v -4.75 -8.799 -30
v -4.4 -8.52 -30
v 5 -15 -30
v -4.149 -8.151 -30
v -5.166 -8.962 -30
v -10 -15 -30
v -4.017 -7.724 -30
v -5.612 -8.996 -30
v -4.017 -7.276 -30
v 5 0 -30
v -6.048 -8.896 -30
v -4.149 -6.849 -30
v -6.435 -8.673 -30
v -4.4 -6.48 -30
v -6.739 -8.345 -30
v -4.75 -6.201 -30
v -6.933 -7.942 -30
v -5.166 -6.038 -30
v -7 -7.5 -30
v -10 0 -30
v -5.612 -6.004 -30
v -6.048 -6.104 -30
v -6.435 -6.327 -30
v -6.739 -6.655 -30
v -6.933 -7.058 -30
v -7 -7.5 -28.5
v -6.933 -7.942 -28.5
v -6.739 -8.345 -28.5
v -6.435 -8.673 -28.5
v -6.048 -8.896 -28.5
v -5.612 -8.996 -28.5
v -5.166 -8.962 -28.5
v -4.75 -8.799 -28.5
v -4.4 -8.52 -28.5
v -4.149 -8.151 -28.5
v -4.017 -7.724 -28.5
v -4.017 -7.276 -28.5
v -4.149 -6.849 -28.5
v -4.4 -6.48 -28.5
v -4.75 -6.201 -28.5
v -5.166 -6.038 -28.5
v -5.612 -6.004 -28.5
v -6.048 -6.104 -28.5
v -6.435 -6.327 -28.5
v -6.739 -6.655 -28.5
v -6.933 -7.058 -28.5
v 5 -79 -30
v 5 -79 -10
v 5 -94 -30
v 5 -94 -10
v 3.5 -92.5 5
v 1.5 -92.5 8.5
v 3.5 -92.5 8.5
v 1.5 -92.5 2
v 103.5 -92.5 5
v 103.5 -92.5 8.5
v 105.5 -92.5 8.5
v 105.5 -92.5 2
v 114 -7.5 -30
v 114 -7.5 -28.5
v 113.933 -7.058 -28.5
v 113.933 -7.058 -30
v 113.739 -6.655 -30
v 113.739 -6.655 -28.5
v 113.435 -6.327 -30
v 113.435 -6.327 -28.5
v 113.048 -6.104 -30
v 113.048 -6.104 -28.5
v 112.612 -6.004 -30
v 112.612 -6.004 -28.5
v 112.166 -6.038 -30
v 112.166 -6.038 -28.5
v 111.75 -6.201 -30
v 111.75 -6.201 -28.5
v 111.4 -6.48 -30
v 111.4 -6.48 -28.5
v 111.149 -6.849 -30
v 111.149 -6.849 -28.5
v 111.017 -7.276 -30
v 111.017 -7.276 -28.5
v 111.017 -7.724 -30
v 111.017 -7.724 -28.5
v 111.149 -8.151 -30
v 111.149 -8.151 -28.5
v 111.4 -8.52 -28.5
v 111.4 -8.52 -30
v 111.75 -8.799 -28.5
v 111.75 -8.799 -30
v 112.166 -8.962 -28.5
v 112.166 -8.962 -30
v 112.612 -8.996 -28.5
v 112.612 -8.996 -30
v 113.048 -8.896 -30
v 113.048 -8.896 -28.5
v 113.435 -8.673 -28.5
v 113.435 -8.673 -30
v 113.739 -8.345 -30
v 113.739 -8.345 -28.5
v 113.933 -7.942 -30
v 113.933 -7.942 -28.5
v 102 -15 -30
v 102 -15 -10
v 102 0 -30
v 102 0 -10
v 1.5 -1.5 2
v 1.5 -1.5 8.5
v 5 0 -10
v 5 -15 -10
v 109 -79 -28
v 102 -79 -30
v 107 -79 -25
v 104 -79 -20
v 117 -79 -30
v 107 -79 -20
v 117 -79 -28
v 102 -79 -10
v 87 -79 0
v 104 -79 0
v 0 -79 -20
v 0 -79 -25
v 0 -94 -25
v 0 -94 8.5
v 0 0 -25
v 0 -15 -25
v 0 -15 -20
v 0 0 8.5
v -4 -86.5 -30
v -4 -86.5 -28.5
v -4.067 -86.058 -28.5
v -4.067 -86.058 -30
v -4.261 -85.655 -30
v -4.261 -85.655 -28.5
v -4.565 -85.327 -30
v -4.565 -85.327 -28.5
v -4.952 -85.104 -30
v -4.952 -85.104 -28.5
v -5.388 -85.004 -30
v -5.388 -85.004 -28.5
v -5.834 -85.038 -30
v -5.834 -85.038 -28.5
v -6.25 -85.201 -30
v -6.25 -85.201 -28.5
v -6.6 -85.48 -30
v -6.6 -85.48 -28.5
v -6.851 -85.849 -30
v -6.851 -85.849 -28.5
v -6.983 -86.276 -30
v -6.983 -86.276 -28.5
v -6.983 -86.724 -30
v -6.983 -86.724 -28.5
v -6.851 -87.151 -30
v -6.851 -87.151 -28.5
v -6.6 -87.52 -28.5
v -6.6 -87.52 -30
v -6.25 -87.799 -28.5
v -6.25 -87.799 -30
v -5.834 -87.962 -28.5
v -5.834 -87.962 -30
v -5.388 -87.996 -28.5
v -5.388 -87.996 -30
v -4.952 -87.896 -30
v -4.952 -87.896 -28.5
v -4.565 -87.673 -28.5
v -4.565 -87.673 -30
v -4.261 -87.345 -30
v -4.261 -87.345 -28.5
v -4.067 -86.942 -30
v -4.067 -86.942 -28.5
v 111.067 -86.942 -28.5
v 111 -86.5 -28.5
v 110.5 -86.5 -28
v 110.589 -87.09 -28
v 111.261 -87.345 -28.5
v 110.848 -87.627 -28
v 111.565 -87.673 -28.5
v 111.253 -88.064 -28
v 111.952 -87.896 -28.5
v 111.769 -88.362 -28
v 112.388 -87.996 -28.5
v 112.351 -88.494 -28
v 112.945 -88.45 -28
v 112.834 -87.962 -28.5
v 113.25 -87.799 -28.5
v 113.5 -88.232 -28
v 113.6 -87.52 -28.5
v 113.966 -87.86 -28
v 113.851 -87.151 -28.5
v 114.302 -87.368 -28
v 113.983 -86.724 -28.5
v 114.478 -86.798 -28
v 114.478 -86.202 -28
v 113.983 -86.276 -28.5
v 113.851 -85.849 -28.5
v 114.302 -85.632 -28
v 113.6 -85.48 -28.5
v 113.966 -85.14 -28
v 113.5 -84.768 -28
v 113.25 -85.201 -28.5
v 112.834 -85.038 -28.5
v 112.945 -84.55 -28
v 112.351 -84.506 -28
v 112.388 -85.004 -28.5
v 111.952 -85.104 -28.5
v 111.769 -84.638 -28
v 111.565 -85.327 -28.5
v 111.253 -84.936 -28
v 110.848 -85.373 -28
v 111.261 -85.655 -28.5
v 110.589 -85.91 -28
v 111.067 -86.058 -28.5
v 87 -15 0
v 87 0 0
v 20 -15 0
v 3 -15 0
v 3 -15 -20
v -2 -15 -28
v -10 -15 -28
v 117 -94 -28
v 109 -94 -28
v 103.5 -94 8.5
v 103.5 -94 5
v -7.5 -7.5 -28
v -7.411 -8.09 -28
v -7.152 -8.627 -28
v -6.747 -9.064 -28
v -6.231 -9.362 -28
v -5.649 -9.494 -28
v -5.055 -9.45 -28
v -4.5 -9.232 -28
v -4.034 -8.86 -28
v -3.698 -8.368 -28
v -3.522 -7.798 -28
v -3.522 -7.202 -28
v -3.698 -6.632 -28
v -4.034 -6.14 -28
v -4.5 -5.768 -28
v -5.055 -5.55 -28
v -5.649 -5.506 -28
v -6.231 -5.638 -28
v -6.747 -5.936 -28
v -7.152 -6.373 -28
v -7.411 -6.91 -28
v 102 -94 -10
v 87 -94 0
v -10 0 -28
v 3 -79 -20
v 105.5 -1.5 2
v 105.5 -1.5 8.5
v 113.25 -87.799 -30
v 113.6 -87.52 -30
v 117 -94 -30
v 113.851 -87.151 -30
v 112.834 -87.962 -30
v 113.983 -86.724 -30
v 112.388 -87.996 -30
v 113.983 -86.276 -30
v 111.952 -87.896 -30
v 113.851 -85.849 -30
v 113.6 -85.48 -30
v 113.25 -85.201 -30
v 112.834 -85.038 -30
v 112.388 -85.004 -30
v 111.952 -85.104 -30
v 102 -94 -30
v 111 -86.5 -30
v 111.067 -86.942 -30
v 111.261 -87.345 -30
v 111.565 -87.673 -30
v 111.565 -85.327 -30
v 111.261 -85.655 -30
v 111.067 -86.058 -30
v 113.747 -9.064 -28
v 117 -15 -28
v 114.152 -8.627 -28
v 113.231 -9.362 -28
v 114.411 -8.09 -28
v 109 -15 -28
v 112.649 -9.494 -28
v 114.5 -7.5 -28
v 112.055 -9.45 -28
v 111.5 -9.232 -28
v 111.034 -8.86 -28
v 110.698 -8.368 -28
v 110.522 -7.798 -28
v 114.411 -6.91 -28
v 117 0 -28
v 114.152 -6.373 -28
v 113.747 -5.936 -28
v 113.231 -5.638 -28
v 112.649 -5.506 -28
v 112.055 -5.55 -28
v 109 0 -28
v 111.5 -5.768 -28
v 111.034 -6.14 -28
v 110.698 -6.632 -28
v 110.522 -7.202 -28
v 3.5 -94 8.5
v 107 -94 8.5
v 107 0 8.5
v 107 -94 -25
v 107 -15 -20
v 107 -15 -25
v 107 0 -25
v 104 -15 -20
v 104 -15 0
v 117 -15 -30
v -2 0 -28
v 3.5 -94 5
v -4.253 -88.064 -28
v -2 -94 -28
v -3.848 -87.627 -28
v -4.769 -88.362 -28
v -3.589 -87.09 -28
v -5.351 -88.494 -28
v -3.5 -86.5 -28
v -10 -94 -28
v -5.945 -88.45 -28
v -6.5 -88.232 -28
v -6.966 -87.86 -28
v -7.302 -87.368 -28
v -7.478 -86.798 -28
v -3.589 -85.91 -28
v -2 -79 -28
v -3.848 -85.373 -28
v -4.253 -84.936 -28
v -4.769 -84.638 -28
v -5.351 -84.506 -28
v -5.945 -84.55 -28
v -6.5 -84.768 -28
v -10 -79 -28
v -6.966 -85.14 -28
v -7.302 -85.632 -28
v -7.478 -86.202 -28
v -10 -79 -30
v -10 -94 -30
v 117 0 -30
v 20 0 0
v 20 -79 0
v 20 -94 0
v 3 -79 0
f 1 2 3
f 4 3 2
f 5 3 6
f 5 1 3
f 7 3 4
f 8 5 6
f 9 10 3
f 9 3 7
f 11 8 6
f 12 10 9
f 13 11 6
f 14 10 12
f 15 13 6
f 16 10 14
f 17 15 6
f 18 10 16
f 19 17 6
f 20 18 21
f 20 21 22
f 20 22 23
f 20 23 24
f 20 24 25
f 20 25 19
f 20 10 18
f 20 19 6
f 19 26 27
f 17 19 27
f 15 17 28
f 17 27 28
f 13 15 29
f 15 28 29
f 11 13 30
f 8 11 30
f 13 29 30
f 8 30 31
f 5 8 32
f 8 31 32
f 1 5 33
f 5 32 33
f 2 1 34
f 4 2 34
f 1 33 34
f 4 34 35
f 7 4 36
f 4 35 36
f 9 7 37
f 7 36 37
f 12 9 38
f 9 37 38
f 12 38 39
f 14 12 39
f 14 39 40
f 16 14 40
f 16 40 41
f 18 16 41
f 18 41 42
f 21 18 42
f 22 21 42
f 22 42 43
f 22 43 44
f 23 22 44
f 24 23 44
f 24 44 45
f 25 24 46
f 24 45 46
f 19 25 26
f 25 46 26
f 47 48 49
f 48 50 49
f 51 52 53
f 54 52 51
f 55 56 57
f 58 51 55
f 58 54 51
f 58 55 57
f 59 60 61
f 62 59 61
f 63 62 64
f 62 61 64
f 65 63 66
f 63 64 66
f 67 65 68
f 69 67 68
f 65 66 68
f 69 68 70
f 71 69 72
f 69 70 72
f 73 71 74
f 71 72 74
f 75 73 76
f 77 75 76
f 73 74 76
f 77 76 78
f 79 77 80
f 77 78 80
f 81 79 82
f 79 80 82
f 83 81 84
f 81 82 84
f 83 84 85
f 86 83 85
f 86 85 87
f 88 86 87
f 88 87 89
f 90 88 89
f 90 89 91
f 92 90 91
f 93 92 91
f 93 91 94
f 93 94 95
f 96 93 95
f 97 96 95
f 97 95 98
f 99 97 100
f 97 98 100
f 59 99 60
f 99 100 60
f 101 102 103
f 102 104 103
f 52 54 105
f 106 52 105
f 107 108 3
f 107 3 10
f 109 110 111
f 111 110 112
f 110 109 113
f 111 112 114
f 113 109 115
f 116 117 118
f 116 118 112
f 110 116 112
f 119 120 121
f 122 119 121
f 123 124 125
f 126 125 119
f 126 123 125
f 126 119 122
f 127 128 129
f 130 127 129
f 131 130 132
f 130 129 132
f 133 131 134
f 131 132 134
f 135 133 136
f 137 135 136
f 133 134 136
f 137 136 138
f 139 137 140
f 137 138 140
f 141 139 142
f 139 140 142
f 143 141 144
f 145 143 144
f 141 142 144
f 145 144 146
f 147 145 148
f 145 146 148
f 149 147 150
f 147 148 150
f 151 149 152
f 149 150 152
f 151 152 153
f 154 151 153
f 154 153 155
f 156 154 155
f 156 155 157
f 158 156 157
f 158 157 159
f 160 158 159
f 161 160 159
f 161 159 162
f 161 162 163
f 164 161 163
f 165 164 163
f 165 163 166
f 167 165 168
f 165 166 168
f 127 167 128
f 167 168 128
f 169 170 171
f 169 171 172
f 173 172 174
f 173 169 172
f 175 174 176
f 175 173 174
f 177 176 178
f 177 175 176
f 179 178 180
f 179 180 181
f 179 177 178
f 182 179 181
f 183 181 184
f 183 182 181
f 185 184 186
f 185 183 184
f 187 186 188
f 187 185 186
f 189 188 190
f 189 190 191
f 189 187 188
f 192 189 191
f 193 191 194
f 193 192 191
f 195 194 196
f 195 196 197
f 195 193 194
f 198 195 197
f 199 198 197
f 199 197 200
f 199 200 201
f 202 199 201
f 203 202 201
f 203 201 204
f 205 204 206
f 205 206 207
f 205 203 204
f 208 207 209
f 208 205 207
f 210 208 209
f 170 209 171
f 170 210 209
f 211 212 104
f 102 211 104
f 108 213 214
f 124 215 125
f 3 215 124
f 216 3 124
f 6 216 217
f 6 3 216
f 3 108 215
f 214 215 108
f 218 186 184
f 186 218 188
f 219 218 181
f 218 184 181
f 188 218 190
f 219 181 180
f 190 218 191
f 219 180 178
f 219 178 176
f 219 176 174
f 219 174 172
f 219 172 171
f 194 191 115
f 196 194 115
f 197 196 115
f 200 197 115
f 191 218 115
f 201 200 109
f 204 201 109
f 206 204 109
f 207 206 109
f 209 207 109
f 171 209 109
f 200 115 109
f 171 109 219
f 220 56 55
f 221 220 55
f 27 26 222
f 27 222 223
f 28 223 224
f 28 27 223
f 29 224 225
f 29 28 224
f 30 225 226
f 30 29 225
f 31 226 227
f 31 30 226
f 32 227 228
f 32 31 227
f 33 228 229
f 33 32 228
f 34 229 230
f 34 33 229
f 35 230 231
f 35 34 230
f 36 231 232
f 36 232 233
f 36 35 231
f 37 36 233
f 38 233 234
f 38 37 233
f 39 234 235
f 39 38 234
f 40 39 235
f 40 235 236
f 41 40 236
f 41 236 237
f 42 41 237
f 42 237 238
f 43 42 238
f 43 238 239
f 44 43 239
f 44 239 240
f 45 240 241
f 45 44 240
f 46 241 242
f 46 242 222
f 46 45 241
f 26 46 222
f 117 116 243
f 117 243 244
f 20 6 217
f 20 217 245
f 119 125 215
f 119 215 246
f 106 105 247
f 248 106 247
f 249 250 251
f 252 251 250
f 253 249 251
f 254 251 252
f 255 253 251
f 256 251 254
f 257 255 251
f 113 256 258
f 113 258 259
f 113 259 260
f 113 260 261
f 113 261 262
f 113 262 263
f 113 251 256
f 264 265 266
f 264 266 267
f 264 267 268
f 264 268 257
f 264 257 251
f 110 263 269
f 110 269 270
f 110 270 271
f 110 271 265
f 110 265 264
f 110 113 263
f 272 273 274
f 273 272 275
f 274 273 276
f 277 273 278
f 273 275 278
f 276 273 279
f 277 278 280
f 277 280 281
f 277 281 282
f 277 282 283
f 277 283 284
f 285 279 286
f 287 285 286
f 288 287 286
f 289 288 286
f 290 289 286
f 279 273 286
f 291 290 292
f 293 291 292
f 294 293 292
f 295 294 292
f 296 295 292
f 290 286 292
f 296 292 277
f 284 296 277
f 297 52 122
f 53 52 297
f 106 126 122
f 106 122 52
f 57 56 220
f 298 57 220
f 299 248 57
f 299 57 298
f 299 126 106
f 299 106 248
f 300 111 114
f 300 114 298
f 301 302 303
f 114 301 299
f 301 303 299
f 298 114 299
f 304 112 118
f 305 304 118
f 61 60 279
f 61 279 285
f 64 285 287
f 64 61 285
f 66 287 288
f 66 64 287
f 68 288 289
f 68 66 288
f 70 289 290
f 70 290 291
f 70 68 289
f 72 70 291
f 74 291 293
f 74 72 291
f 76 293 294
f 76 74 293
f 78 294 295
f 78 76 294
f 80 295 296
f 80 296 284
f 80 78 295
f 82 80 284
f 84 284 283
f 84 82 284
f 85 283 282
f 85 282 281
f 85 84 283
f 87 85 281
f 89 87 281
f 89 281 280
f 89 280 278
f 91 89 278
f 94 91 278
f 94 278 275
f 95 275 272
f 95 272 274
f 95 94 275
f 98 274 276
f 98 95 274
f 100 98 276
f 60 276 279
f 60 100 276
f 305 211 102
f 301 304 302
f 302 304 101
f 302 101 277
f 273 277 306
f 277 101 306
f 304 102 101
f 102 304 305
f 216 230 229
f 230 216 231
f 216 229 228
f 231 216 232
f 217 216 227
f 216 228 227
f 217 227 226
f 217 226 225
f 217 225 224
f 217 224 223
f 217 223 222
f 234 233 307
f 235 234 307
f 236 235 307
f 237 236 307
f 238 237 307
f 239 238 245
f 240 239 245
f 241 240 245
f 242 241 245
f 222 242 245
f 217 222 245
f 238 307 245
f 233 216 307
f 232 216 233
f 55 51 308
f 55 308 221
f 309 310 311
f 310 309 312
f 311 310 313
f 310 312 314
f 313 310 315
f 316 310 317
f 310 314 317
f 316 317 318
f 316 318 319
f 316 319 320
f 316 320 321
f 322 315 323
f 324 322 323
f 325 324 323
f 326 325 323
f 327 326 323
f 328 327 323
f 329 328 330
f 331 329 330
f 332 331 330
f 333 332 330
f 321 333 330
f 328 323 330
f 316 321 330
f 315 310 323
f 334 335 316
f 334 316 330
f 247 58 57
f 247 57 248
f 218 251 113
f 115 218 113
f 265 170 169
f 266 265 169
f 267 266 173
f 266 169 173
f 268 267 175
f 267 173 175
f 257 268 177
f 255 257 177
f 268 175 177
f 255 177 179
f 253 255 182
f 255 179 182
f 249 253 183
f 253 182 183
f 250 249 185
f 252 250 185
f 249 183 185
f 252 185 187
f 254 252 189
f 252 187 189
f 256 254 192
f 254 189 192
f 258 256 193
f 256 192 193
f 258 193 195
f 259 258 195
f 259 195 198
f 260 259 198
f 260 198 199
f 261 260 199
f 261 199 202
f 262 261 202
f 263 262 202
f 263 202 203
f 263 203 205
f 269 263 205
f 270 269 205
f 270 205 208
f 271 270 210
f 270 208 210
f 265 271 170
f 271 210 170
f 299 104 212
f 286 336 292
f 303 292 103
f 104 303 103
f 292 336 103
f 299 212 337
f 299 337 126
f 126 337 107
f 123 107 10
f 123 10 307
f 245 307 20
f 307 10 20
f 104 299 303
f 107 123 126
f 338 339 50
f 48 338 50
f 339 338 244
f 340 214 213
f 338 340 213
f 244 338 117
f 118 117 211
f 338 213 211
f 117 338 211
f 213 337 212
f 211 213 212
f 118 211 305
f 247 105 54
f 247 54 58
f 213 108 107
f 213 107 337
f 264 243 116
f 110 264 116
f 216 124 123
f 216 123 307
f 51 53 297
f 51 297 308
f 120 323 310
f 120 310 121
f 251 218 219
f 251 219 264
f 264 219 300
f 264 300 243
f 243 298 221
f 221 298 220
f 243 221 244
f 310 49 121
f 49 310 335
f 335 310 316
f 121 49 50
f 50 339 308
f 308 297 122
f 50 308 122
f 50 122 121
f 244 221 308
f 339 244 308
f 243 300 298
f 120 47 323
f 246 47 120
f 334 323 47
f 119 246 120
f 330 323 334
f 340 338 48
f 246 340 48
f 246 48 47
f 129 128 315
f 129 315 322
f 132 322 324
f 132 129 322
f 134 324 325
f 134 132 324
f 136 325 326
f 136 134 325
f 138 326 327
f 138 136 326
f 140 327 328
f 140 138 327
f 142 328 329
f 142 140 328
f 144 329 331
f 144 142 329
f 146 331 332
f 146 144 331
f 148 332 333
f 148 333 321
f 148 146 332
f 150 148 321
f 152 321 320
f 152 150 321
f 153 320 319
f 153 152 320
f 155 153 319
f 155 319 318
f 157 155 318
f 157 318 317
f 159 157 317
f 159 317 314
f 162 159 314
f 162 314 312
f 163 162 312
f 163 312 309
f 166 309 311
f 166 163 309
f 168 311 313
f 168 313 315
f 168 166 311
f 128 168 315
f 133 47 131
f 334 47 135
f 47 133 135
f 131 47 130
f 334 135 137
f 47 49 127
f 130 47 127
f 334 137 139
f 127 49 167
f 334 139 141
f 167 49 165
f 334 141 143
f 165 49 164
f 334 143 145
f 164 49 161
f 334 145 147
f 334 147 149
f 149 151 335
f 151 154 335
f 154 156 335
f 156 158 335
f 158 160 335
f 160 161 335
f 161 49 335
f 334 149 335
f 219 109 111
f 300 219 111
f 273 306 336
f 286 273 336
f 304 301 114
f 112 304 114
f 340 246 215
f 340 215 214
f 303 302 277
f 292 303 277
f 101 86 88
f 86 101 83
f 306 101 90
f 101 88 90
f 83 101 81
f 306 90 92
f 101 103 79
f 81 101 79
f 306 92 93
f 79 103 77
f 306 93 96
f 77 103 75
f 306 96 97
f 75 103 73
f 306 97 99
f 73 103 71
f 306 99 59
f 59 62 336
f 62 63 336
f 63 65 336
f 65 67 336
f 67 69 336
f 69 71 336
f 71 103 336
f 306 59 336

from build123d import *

# Parameters (mm, degrees)
SKETCH_1_W               = 107
SKETCH_1_H               = 94
EXTRUDE_1_DEPTH          = 2
SKETCH_2_W               = 107
SKETCH_2_H               = 94
SKETCH_2_W_2             = 104
SKETCH_2_H_2             = 91
EXTRUDE_2_DEPTH          = 6.5
SKETCH_5_W               = 100
SKETCH_5_H               = 3.5
CUT_EXTRUDE_2_DEPTH      = 1.5
SKETCH_3_W               = 5
SKETCH_3_H               = 15
EXTRUDE_3_DEPTH          = 30
CUT_EXTRUDE_3_DEPTH      = 148.537283424
CUT_EXTRUDE_3_DEPTH_BACK = 30
SKETCH_6_W               = 3
SKETCH_6_H               = 9
SKETCH_7_W               = 10
SKETCH_7_H               = 15
EXTRUDE_4_DEPTH          = 2
SKETCH_8_R               = 1.5
CUT_EXTRUDE_4_DEPTH      = 2
CHAMFER_1_SIZE           = 0.5
EXTRUDE_5_DEPTH          = 3
EXTRUDE_6_DEPTH          = 3
EXTRUDE_7_DEPTH          = 3
MIRROR_2_COPY_1_DEPTH    = 3
EXTRUDE_8_DEPTH          = 15
EXTRUDE_9_DEPTH          = 15
EXTRUDE_10_DEPTH         = 9
EXTRUDE_11_DEPTH         = 9
EXTRUDE_12_DEPTH         = 3


with BuildPart() as part:
    # 草图1 → 凸台-拉伸1 (new body)
    with BuildSketch(Plane.XY):
        with Locations((53.5, -47)):
            Rectangle(SKETCH_1_W, SKETCH_1_H)
    extrude(amount=EXTRUDE_1_DEPTH)

    # 草图2 → 凸台-拉伸2 (add)
    with BuildSketch(Plane.XY.offset(2)):
        with Locations((53.5, -47)):
            Rectangle(SKETCH_2_W, SKETCH_2_H)
        with Locations((53.5, -47)):
            Rectangle(SKETCH_2_W_2, SKETCH_2_H_2, mode=Mode.SUBTRACT)
    extrude(amount=EXTRUDE_2_DEPTH)

    # 草图5 → 切除-拉伸2 (cut)
    with BuildSketch(Plane(origin=(0, -92.5, 0), x_dir=(1, 0, 0), z_dir=(0, 1, 0))):
        with Locations((53.5, -6.75)):
            Rectangle(SKETCH_5_W, SKETCH_5_H)
    extrude(amount=-CUT_EXTRUDE_2_DEPTH, mode=Mode.SUBTRACT)

    # 草图3 → 凸台-拉伸3 (add)
    with BuildSketch(Plane(origin=(0, 0, 0), x_dir=(-1, 0, 0), z_dir=(0, 0, -1))):
        with Locations((-2.5, -7.5)):
            Rectangle(SKETCH_3_W, SKETCH_3_H)
        with Locations((-104.5, -7.5)):
            Rectangle(SKETCH_3_W, SKETCH_3_H)
        with Locations((-2.5, -86.5)):
            Rectangle(SKETCH_3_W, SKETCH_3_H)
        with Locations((-104.5, -86.5)):
            Rectangle(SKETCH_3_W, SKETCH_3_H)
    extrude(amount=EXTRUDE_3_DEPTH)

    # 草图6 → 切除-拉伸3 (cut, two sides: drawn at the far end of the back side and taken through both)
    with BuildSketch(Plane(origin=(0, 0, -30), x_dir=(-1, 0, 0), z_dir=(0, 0, -1)).offset(-CUT_EXTRUDE_3_DEPTH_BACK)):
        with Locations((-103.5, -7.5)):
            Rectangle(SKETCH_6_W, SKETCH_6_H)
        with Locations((-103.5, -86.5)):
            Rectangle(SKETCH_6_W, SKETCH_6_H)
        with Locations((-3.5, -86.5)):
            Rectangle(SKETCH_6_W, SKETCH_6_H)
        with Locations((-3.5, -7.5)):
            Rectangle(SKETCH_6_W, SKETCH_6_H)
    extrude(amount=CUT_EXTRUDE_3_DEPTH + CUT_EXTRUDE_3_DEPTH_BACK, mode=Mode.SUBTRACT)

    # 草图7 → 凸台-拉伸4 (add)
    with BuildSketch(Plane(origin=(0, 0, -30), x_dir=(-1, 0, 0), z_dir=(0, 0, -1))):
        with Locations((5, -7.5)):
            Rectangle(SKETCH_7_W, SKETCH_7_H)
        with Locations((5, -86.5)):
            Rectangle(SKETCH_7_W, SKETCH_7_H)
        with Locations((-112, -7.5)):
            Rectangle(SKETCH_7_W, SKETCH_7_H)
        with Locations((-112, -86.5)):
            Rectangle(SKETCH_7_W, SKETCH_7_H)
    extrude(amount=-EXTRUDE_4_DEPTH)

    # 草图8 → 切除-拉伸4 (cut)
    with BuildSketch(Plane.XY.offset(-28)):
        with Locations((112.5, -7.5)):
            Circle(SKETCH_8_R)
        with Locations(Location((112.5, -86.5, 0), (0, 0, 180))):
            Circle(SKETCH_8_R)
        with Locations(Location((-5.5, -7.5, 0), (0, 0, 180))):
            Circle(SKETCH_8_R)
        with Locations((-5.5, -86.5)):
            Circle(SKETCH_8_R)
    extrude(amount=-CUT_EXTRUDE_4_DEPTH, mode=Mode.SUBTRACT)

    # 倒角1
    chamfer_1_edges = [part.edges().sort_by_distance(p)[0] for p in [
        (114, -86.5, -28),
        (-4, -7.5, -28),
        (-7, -86.5, -28),
        (111, -7.5, -28),
    ]]
    chamfer(chamfer_1_edges, length=CHAMFER_1_SIZE)

    # 草图9 → 凸台-拉伸5 (add)
    with BuildSketch(Plane.XZ.offset(94)):
        Polygon((87, 0), (102, -10), (102, 0), align=None)
        Polygon((5, 0), (20, 0), (5, -10), align=None)
    extrude_5 = extrude(amount=-EXTRUDE_5_DEPTH)

    # 草图10 → 凸台-拉伸6 (add)
    with BuildSketch(Plane(origin=(0, -79, 0), x_dir=(1, 0, 0), z_dir=(0, 1, 0))):
        Polygon((102, 10), (87, 0), (102, 0), align=None)
        Polygon((5, 0), (5, 10), (20, 0), align=None)
    extrude_6 = extrude(amount=-EXTRUDE_6_DEPTH)

    # 草图11 → 凸台-拉伸7 (add)
    with BuildSketch(Plane.ZY):
        Polygon((-20, -79), (0, -69), (0, -79), align=None)
    extrude_7 = extrude(amount=-EXTRUDE_7_DEPTH)

    # 镜向1: 凸台-拉伸7 across plane
    add(extrude_7.mirror(Plane(origin=(53.5, 0, 0), x_dir=(0, 0, 1), z_dir=(1, 0, 0))))

    # 镜向2: 凸台-拉伸5, 凸台-拉伸6, 凸台-拉伸7 across plane
    add(extrude_5.mirror(Plane.ZX.offset(-47)))
    add(extrude_6.mirror(Plane.ZX.offset(-47)))
    add(extrude_7.mirror(Plane.ZX.offset(-47)))

    # 镜向2 copy 1 sketch → 镜向2 copy 1 (add)
    with BuildSketch(Plane(origin=(107, -94, 0), x_dir=(0, 0, 1), z_dir=(1, 0, 0))):
        Polygon((-20, -79), (0, -69), (0, -79), align=None)
    extrude(amount=-MIRROR_2_COPY_1_DEPTH)

    # 草图12 → 凸台-拉伸8 (add)
    with BuildSketch(Plane(origin=(0, 0, 0), x_dir=(1, 0, 0), z_dir=(0, 1, 0))):
        Polygon((107, 25), (109, 28), (107, 28), align=None)
    extrude_8 = extrude(amount=-EXTRUDE_8_DEPTH)

    # 草图13 → 凸台-拉伸9 (add)
    with BuildSketch(Plane.XZ.offset(94)):
        Polygon((109, -28), (107, -25), (107, -28), align=None)
    extrude_9 = extrude(amount=-EXTRUDE_9_DEPTH)

    # 镜向3: 凸台-拉伸8, 凸台-拉伸9 across plane
    add(extrude_8.mirror(Plane(origin=(53.5, 0, 0), x_dir=(0, 0, 1), z_dir=(1, 0, 0))))
    add(extrude_9.mirror(Plane(origin=(53.5, 0, 0), x_dir=(0, 0, 1), z_dir=(1, 0, 0))))

    # 草图14 → 凸台-拉伸10 (add)
    with BuildSketch(Plane(origin=(0, -91, 0), x_dir=(1, 0, 0), z_dir=(0, 1, 0))):
        Polygon((2, 30), (2, 0), (20, 0), (5, 10), (5, 30), align=None)
        Polygon((102, 30), (102, 10), (87, 0), (105, 0), (105, 30), align=None)
    extrude(amount=EXTRUDE_10_DEPTH)

    # 草图15 → 凸台-拉伸11 (add)
    with BuildSketch(Plane.XZ.offset(3)):
        Polygon((105, -30), (105, 0), (87, 0), (102, -10), (102, -30), align=None)
        Polygon((5, -30), (5, -10), (20, 0), (2, 0), (2, -30), align=None)
    extrude(amount=EXTRUDE_11_DEPTH)

    # 草图17 → 凸台-拉伸12 (add)
    with BuildSketch(Plane.ZY):
        Polygon((-20, -15), (-20, -79), (0, -69), (0, -25), align=None)
    extrude_12 = extrude(amount=-EXTRUDE_12_DEPTH)

    # 镜向4: 凸台-拉伸12 across plane
    add(extrude_12.mirror(Plane(origin=(53.5, 0, 0), x_dir=(0, 0, 1), z_dir=(1, 0, 0))))


solid = part.part
